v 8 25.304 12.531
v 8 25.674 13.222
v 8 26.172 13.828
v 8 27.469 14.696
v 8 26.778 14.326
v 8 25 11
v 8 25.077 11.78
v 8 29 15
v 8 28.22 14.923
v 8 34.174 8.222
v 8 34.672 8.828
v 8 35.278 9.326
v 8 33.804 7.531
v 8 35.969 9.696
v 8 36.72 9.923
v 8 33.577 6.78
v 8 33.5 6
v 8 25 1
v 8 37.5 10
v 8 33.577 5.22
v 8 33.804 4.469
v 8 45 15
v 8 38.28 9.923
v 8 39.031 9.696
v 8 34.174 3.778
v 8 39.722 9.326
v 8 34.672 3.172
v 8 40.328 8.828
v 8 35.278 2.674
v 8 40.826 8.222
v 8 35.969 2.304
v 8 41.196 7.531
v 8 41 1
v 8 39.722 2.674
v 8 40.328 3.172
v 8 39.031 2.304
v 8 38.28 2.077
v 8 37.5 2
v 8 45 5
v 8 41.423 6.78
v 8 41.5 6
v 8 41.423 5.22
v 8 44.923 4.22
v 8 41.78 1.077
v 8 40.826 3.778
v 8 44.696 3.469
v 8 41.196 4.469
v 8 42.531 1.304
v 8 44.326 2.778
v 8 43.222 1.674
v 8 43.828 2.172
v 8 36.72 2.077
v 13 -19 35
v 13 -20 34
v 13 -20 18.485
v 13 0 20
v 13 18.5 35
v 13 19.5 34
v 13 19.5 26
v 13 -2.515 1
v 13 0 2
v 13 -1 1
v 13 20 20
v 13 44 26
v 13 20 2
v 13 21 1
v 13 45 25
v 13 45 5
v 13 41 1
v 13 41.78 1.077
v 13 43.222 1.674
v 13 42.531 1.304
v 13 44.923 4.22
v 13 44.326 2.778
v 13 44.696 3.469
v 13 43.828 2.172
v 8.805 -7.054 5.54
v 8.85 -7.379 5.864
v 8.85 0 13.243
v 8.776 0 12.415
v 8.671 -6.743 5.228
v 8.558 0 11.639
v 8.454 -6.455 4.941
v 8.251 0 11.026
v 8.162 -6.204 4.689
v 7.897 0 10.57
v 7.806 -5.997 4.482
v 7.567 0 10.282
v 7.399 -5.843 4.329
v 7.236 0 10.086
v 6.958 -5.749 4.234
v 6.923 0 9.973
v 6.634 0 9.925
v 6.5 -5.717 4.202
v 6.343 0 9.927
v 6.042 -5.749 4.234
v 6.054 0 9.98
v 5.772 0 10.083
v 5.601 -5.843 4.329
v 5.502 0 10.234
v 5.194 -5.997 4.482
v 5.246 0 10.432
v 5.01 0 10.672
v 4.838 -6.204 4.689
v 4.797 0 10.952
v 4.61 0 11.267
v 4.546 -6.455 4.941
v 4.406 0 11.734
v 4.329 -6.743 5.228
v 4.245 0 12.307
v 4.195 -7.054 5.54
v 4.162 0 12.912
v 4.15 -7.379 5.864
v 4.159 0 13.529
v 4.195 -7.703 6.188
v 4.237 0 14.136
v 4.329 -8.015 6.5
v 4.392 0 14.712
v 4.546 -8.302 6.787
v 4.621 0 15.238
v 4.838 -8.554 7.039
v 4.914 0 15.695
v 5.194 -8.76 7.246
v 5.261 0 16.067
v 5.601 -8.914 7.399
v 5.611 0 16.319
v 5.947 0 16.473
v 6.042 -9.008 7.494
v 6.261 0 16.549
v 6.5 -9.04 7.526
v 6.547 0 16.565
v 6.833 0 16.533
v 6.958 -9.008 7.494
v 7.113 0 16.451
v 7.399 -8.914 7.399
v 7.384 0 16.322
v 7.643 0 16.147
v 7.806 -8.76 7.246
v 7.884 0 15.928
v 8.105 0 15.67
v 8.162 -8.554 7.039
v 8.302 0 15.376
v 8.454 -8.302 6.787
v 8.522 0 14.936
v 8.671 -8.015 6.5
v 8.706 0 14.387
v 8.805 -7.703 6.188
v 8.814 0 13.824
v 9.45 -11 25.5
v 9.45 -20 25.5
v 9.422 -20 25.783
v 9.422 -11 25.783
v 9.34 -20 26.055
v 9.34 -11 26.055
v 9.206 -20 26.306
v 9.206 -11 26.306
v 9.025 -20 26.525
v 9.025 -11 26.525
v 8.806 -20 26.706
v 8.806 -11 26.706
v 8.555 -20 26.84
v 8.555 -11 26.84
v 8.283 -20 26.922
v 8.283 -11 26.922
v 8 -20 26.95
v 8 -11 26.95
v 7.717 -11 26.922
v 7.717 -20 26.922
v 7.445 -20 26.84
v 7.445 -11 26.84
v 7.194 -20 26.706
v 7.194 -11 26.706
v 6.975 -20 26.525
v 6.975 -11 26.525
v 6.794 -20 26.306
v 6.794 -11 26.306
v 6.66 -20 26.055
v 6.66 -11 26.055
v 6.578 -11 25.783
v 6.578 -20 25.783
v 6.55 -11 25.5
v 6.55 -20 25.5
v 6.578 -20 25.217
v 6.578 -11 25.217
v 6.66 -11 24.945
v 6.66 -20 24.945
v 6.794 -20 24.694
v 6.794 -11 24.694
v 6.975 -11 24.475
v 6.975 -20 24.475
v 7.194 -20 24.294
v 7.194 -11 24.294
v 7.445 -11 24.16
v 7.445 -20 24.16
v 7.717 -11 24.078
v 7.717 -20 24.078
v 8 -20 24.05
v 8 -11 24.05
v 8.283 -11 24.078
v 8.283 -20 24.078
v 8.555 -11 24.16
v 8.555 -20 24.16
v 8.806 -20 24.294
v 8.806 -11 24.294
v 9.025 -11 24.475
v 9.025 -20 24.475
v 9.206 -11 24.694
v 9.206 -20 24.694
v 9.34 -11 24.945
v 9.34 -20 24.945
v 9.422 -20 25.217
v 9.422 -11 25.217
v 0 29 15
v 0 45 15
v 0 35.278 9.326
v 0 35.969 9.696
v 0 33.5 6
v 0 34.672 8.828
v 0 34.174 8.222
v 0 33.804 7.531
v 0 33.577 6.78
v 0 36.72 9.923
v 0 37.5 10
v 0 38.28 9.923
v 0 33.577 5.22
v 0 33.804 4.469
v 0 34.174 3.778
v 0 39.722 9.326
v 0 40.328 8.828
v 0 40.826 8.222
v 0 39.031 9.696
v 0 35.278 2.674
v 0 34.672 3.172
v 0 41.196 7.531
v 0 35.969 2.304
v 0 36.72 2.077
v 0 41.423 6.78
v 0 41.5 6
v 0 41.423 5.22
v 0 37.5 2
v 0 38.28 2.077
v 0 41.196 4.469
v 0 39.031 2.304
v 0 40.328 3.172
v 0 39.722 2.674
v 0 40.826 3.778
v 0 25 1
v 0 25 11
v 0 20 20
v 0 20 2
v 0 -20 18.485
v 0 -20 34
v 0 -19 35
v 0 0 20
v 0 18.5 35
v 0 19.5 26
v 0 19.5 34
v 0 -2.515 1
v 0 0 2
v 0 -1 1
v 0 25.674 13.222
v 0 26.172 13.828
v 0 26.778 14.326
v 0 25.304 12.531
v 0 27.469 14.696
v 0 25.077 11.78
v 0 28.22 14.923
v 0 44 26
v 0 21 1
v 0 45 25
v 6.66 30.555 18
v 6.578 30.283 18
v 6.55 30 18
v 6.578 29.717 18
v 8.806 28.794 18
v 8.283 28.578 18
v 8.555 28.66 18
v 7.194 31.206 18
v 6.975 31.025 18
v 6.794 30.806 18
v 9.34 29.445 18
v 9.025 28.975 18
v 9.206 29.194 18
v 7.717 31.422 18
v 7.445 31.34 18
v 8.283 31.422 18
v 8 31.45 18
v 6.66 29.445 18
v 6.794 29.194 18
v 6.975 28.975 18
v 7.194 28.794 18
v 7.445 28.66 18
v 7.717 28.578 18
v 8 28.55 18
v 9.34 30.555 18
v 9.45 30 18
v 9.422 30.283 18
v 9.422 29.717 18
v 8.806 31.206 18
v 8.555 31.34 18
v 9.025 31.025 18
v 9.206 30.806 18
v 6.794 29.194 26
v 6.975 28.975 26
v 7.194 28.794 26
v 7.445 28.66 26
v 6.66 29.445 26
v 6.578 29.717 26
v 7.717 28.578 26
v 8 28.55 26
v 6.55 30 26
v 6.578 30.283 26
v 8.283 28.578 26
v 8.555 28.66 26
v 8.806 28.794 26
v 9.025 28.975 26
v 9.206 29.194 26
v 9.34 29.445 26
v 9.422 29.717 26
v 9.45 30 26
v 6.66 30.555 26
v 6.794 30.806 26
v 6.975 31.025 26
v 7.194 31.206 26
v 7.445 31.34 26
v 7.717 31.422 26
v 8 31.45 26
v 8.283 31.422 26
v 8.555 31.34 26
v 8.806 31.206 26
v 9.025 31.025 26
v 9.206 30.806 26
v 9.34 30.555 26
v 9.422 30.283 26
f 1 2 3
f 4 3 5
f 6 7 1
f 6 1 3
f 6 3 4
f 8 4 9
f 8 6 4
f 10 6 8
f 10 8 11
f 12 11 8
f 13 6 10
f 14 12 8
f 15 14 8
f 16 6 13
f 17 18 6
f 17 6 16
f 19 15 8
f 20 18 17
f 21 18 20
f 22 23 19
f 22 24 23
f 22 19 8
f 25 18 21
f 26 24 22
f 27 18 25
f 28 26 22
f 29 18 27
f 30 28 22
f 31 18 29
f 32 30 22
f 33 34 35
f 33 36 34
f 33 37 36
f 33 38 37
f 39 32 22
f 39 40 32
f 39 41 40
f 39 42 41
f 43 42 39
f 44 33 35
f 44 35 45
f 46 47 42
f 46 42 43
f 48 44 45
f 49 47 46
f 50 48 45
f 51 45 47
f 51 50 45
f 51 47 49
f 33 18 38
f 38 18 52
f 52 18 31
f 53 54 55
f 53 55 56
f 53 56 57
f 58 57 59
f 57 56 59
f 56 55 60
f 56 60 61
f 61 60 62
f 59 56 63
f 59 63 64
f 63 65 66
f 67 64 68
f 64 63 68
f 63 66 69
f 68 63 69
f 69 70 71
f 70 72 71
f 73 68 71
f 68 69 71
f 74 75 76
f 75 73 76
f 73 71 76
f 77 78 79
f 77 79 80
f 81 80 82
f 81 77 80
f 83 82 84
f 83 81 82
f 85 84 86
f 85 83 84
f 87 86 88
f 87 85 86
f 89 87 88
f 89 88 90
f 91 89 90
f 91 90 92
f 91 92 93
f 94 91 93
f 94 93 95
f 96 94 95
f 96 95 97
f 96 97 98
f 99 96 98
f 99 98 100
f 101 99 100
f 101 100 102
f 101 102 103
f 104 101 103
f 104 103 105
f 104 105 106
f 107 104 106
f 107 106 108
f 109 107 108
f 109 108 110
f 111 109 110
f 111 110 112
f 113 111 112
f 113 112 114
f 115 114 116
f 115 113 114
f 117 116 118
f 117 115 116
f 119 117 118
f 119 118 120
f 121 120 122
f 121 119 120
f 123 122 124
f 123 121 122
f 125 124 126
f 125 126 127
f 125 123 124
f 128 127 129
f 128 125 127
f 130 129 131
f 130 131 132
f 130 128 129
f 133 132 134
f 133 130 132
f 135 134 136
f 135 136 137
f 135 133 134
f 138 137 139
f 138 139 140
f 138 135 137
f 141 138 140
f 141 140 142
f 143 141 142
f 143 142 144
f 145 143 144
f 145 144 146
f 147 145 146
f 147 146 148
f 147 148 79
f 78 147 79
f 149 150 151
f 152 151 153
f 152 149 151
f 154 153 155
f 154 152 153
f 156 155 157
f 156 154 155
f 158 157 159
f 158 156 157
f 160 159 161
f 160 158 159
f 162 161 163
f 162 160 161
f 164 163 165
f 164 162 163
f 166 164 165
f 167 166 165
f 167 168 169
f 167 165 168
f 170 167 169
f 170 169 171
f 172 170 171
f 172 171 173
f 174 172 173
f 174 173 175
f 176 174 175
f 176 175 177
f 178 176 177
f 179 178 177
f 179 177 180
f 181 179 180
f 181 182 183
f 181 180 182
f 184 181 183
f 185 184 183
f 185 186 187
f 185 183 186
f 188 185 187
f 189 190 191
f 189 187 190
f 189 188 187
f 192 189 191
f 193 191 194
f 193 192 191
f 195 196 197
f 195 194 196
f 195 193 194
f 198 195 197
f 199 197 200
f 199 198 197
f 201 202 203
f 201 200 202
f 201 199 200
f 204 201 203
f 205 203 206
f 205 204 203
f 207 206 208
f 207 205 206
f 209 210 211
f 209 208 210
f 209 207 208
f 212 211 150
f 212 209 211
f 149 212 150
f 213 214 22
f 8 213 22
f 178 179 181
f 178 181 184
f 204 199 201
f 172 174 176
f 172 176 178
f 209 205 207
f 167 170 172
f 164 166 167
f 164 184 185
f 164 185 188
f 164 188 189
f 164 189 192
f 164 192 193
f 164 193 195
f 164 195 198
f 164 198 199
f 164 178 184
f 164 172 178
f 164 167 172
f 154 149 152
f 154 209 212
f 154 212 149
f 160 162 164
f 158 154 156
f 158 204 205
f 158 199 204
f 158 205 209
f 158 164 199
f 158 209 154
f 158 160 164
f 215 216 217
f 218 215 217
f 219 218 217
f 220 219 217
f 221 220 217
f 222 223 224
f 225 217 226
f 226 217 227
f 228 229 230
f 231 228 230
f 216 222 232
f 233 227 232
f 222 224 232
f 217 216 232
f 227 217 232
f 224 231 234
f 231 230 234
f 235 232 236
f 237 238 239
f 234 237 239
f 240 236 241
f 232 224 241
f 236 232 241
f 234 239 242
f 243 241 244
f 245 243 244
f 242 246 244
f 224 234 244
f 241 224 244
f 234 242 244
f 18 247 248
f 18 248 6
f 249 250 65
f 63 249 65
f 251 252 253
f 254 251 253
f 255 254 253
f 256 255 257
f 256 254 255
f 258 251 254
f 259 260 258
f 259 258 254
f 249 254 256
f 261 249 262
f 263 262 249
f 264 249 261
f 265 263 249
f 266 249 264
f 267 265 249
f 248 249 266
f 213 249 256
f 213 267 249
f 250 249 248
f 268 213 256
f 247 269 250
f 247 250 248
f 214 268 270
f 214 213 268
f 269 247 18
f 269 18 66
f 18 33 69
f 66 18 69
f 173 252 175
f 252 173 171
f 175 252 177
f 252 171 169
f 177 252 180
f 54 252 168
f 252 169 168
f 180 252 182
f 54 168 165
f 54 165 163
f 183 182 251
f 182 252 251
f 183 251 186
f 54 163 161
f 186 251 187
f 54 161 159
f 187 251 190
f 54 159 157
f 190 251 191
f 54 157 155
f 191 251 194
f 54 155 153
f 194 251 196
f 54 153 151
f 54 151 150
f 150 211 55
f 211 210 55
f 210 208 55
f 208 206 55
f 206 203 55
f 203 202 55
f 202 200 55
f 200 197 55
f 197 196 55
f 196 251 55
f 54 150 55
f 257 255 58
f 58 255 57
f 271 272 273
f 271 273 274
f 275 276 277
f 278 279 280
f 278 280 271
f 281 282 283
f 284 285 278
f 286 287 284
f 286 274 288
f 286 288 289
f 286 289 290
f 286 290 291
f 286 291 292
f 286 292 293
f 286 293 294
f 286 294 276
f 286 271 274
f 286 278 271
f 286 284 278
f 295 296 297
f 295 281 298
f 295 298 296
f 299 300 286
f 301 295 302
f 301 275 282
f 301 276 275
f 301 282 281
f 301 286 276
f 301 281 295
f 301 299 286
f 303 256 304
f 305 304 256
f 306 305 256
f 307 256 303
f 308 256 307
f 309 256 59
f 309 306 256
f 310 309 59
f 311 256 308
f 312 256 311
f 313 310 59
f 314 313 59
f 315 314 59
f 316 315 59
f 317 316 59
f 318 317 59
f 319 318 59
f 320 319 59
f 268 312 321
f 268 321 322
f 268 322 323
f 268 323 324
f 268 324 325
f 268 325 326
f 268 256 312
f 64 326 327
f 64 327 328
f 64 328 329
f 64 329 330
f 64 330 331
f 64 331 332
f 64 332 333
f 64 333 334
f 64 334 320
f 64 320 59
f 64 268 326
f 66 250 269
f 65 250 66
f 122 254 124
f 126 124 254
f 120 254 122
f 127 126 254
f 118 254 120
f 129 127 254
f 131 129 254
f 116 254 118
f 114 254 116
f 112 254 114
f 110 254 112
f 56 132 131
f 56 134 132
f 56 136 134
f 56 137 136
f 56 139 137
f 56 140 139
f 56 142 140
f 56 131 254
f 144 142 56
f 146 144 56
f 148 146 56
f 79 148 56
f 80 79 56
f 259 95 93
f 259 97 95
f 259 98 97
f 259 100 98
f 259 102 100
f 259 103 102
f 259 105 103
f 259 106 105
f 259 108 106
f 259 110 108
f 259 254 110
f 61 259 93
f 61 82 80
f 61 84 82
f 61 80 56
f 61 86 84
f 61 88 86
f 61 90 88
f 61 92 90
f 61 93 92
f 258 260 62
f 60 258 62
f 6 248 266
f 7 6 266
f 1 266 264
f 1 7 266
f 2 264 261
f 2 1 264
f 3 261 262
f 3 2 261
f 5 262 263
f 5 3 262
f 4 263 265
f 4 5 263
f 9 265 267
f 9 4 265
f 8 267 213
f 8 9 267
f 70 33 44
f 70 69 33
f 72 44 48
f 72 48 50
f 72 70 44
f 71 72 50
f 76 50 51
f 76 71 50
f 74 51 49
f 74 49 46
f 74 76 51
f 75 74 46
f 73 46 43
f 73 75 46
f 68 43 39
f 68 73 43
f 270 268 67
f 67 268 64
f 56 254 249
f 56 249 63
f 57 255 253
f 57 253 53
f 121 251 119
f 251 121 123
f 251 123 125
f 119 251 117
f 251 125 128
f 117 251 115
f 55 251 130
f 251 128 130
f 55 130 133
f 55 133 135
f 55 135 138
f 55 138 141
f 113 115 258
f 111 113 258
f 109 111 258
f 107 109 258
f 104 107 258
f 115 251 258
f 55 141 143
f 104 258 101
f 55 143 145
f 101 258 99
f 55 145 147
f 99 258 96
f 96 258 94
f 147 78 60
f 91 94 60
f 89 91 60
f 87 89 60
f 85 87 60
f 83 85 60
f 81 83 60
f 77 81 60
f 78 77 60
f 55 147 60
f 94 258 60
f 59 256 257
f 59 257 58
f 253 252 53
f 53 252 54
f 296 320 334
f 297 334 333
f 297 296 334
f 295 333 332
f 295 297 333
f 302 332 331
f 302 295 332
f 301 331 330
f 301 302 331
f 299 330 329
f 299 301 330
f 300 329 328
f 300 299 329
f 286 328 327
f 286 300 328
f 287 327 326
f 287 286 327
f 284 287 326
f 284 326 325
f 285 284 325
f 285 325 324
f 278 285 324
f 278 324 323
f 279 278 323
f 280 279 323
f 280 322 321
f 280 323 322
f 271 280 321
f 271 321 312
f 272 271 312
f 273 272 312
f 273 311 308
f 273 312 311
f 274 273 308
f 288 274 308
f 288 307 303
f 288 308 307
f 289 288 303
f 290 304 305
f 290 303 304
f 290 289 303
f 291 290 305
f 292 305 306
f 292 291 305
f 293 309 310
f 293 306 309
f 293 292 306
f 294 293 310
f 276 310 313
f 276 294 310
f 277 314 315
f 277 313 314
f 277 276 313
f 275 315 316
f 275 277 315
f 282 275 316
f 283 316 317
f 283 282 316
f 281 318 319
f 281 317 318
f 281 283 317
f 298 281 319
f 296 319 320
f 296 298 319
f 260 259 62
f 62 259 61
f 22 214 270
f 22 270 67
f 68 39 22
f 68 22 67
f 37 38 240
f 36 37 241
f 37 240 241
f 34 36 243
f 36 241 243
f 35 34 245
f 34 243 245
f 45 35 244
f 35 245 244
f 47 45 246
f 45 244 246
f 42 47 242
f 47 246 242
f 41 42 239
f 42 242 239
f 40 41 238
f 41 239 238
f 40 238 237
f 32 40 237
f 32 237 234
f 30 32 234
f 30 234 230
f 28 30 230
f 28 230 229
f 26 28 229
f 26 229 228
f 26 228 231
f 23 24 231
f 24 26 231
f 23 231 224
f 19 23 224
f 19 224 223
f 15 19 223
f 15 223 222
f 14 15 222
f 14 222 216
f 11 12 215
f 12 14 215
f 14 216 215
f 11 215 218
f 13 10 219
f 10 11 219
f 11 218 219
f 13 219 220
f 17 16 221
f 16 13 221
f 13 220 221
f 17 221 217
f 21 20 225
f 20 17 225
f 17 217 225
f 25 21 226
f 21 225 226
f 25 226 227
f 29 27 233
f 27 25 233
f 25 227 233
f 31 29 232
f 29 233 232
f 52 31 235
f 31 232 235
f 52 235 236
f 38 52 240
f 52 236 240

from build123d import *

# Parameters (mm, degrees)
BOX012_W                    = 13
BOX012_H                    = 65
BOX012_DEPTH                = 1
CYLINDER004_R               = 4
CYLINDER004_DEPTH           = 10
CYLINDER002_R               = 1.45
CYLINDER002_DEPTH           = 10
CYLINDER001_R               = 2.35
CYLINDER001_DEPTH           = 15
CYLINDER001_PLACEMENT_ANGLE = 45
CYLINDER_R                  = 1.45
CYLINDER_DEPTH              = 10
BOX004_W                    = 8
BOX004_H                    = 20
BOX004_DEPTH                = 15
BOX002_W                    = 13
BOX002_H                    = 25.5
BOX002_DEPTH                = 9
BOX003_W                    = 13
BOX003_H                    = 25
BOX003_DEPTH                = 50
BOX003_PLACEMENT_ANGLE      = 45
BOX_W                       = 13
BOX_H                       = 20
BOX_DEPTH                   = 20
BOX001_W                    = 13
BOX001_H                    = 65
BOX001_DEPTH                = 35
CHAMFER_SIZE                = 1
FILLET_R                    = 4


with BuildPart() as cube008:
    # Box012 → Box012 (new body)
    with BuildSketch(Plane(origin=(0, -20, 0), x_dir=(1, 0, 0), z_dir=(0, 0, 1))):
        with Locations((6.5, 32.5)):
            Rectangle(BOX012_W, BOX012_H)
    extrude(amount=BOX012_DEPTH)


with BuildPart() as cylinder004:
    # Cylinder004 → Cylinder004 (new body)
    with BuildSketch(Plane(origin=(0, 37.5, 6), x_dir=(0, 0, -1), z_dir=(1, 0, 0))):
        Circle(CYLINDER004_R)
    extrude(amount=CYLINDER004_DEPTH)


with BuildPart() as cylinder002:
    # Cylinder002 → Cylinder002 (new body)
    with BuildSketch(Plane(origin=(8, -11, 25.5), x_dir=(1, 0, 0), z_dir=(0, -1, 0))):
        Circle(CYLINDER002_R)
    extrude(amount=CYLINDER002_DEPTH)


with BuildPart() as cylinder001:
    # Cylinder001 → Cylinder001 (new body)
    with BuildSketch(Plane.XY):
        Circle(CYLINDER001_R)
    extrude(amount=CYLINDER001_DEPTH)


with BuildPart() as cylinder001_1:
    # Cylinder001 placement: moved
    add(cylinder001.part.moved(Location((6.5, -8.899495, 4.343146))).rotate(Axis((6.5, -8.899495, 4.343146), (-1, 0, 0)), CYLINDER001_PLACEMENT_ANGLE))


with BuildPart() as fusion_holes:
    # Cylinder → Cylinder (new body)
    with BuildSketch(Plane(origin=(8, 30, 18), x_dir=(1, 0, 0), z_dir=(0, 0, 1))):
        Circle(CYLINDER_R)
    extrude(amount=CYLINDER_DEPTH)

    # Fusion001: union Cylinder002, Cylinder001
    add(cylinder002.part)
    add(cylinder001_1.part)


with BuildPart() as cube003:
    # Box004 → Box004 (new body)
    with BuildSketch(Plane(origin=(0, 25, 0), x_dir=(1, 0, 0), z_dir=(0, 0, 1))):
        with Locations((4, 10)):
            Rectangle(BOX004_W, BOX004_H)
    extrude(amount=BOX004_DEPTH)


with BuildPart() as cube002:
    # Box002 → Box002 (new body)
    with BuildSketch(Plane(origin=(0, 19.5, 26), x_dir=(1, 0, 0), z_dir=(0, 0, 1))):
        with Locations((6.5, 12.75)):
            Rectangle(BOX002_W, BOX002_H)
    extrude(amount=BOX002_DEPTH)


with BuildPart() as cube_45deg:
    # Box003 → Box003 (new body)
    with BuildSketch(Plane.XY):
        with Locations((6.5, 12.5)):
            Rectangle(BOX003_W, BOX003_H)
    extrude(amount=BOX003_DEPTH)


with BuildPart() as cube_45deg_1:
    # Box003 placement: moved
    add(cube_45deg.part.moved(Location((0, -18.485281, -18.384776))).rotate(Axis((0, -18.485281, -18.384776), (1, 0, 0)), BOX003_PLACEMENT_ANGLE))


with BuildPart() as fusion:
    # Box → Box (new body)
    with BuildSketch(Plane.XY):
        with Locations((6.5, 10)):
            Rectangle(BOX_W, BOX_H)
    extrude(amount=BOX_DEPTH)

    # Fusion: union Cube002, cube_45deg
    add(cube002.part)
    add(cube_45deg_1.part)


with BuildPart() as body:
    # Box001 → Box001 (new body)
    with BuildSketch(Plane(origin=(0, -20, 0), x_dir=(1, 0, 0), z_dir=(0, 0, 1))):
        with Locations((6.5, 32.5)):
            Rectangle(BOX001_W, BOX001_H)
    extrude(amount=BOX001_DEPTH)

    # Cut: cut Fusion
    add(fusion.part, mode=Mode.SUBTRACT)

    # Cut001: cut Cube003
    add(cube003.part, mode=Mode.SUBTRACT)

    # Cut002: cut fusion holes
    add(fusion_holes.part, mode=Mode.SUBTRACT)

    # Fusion002: union Cylinder004
    add(cylinder004.part)

    # Cut008: cut Cube008
    add(cube008.part, mode=Mode.SUBTRACT)

    # Chamfer
    chamfer_edges = [body.edges().sort_by_distance(p)[0] for p in [
        (6.5, 45, 26),
        (6.5, 19.5, 35),
        (6.5, -20, 35),
        (6.5, 0, 1),
        (6.5, 20, 1),
    ]]
    chamfer(chamfer_edges, length=CHAMFER_SIZE)

    # Fillet
    fillet_edges = [body.edges().sort_by_distance(p)[0] for p in [
        (10.5, 45, 1),
        (4, 25, 15),
    ]]
    fillet(fillet_edges, radius=FILLET_R)


solid = body.part
